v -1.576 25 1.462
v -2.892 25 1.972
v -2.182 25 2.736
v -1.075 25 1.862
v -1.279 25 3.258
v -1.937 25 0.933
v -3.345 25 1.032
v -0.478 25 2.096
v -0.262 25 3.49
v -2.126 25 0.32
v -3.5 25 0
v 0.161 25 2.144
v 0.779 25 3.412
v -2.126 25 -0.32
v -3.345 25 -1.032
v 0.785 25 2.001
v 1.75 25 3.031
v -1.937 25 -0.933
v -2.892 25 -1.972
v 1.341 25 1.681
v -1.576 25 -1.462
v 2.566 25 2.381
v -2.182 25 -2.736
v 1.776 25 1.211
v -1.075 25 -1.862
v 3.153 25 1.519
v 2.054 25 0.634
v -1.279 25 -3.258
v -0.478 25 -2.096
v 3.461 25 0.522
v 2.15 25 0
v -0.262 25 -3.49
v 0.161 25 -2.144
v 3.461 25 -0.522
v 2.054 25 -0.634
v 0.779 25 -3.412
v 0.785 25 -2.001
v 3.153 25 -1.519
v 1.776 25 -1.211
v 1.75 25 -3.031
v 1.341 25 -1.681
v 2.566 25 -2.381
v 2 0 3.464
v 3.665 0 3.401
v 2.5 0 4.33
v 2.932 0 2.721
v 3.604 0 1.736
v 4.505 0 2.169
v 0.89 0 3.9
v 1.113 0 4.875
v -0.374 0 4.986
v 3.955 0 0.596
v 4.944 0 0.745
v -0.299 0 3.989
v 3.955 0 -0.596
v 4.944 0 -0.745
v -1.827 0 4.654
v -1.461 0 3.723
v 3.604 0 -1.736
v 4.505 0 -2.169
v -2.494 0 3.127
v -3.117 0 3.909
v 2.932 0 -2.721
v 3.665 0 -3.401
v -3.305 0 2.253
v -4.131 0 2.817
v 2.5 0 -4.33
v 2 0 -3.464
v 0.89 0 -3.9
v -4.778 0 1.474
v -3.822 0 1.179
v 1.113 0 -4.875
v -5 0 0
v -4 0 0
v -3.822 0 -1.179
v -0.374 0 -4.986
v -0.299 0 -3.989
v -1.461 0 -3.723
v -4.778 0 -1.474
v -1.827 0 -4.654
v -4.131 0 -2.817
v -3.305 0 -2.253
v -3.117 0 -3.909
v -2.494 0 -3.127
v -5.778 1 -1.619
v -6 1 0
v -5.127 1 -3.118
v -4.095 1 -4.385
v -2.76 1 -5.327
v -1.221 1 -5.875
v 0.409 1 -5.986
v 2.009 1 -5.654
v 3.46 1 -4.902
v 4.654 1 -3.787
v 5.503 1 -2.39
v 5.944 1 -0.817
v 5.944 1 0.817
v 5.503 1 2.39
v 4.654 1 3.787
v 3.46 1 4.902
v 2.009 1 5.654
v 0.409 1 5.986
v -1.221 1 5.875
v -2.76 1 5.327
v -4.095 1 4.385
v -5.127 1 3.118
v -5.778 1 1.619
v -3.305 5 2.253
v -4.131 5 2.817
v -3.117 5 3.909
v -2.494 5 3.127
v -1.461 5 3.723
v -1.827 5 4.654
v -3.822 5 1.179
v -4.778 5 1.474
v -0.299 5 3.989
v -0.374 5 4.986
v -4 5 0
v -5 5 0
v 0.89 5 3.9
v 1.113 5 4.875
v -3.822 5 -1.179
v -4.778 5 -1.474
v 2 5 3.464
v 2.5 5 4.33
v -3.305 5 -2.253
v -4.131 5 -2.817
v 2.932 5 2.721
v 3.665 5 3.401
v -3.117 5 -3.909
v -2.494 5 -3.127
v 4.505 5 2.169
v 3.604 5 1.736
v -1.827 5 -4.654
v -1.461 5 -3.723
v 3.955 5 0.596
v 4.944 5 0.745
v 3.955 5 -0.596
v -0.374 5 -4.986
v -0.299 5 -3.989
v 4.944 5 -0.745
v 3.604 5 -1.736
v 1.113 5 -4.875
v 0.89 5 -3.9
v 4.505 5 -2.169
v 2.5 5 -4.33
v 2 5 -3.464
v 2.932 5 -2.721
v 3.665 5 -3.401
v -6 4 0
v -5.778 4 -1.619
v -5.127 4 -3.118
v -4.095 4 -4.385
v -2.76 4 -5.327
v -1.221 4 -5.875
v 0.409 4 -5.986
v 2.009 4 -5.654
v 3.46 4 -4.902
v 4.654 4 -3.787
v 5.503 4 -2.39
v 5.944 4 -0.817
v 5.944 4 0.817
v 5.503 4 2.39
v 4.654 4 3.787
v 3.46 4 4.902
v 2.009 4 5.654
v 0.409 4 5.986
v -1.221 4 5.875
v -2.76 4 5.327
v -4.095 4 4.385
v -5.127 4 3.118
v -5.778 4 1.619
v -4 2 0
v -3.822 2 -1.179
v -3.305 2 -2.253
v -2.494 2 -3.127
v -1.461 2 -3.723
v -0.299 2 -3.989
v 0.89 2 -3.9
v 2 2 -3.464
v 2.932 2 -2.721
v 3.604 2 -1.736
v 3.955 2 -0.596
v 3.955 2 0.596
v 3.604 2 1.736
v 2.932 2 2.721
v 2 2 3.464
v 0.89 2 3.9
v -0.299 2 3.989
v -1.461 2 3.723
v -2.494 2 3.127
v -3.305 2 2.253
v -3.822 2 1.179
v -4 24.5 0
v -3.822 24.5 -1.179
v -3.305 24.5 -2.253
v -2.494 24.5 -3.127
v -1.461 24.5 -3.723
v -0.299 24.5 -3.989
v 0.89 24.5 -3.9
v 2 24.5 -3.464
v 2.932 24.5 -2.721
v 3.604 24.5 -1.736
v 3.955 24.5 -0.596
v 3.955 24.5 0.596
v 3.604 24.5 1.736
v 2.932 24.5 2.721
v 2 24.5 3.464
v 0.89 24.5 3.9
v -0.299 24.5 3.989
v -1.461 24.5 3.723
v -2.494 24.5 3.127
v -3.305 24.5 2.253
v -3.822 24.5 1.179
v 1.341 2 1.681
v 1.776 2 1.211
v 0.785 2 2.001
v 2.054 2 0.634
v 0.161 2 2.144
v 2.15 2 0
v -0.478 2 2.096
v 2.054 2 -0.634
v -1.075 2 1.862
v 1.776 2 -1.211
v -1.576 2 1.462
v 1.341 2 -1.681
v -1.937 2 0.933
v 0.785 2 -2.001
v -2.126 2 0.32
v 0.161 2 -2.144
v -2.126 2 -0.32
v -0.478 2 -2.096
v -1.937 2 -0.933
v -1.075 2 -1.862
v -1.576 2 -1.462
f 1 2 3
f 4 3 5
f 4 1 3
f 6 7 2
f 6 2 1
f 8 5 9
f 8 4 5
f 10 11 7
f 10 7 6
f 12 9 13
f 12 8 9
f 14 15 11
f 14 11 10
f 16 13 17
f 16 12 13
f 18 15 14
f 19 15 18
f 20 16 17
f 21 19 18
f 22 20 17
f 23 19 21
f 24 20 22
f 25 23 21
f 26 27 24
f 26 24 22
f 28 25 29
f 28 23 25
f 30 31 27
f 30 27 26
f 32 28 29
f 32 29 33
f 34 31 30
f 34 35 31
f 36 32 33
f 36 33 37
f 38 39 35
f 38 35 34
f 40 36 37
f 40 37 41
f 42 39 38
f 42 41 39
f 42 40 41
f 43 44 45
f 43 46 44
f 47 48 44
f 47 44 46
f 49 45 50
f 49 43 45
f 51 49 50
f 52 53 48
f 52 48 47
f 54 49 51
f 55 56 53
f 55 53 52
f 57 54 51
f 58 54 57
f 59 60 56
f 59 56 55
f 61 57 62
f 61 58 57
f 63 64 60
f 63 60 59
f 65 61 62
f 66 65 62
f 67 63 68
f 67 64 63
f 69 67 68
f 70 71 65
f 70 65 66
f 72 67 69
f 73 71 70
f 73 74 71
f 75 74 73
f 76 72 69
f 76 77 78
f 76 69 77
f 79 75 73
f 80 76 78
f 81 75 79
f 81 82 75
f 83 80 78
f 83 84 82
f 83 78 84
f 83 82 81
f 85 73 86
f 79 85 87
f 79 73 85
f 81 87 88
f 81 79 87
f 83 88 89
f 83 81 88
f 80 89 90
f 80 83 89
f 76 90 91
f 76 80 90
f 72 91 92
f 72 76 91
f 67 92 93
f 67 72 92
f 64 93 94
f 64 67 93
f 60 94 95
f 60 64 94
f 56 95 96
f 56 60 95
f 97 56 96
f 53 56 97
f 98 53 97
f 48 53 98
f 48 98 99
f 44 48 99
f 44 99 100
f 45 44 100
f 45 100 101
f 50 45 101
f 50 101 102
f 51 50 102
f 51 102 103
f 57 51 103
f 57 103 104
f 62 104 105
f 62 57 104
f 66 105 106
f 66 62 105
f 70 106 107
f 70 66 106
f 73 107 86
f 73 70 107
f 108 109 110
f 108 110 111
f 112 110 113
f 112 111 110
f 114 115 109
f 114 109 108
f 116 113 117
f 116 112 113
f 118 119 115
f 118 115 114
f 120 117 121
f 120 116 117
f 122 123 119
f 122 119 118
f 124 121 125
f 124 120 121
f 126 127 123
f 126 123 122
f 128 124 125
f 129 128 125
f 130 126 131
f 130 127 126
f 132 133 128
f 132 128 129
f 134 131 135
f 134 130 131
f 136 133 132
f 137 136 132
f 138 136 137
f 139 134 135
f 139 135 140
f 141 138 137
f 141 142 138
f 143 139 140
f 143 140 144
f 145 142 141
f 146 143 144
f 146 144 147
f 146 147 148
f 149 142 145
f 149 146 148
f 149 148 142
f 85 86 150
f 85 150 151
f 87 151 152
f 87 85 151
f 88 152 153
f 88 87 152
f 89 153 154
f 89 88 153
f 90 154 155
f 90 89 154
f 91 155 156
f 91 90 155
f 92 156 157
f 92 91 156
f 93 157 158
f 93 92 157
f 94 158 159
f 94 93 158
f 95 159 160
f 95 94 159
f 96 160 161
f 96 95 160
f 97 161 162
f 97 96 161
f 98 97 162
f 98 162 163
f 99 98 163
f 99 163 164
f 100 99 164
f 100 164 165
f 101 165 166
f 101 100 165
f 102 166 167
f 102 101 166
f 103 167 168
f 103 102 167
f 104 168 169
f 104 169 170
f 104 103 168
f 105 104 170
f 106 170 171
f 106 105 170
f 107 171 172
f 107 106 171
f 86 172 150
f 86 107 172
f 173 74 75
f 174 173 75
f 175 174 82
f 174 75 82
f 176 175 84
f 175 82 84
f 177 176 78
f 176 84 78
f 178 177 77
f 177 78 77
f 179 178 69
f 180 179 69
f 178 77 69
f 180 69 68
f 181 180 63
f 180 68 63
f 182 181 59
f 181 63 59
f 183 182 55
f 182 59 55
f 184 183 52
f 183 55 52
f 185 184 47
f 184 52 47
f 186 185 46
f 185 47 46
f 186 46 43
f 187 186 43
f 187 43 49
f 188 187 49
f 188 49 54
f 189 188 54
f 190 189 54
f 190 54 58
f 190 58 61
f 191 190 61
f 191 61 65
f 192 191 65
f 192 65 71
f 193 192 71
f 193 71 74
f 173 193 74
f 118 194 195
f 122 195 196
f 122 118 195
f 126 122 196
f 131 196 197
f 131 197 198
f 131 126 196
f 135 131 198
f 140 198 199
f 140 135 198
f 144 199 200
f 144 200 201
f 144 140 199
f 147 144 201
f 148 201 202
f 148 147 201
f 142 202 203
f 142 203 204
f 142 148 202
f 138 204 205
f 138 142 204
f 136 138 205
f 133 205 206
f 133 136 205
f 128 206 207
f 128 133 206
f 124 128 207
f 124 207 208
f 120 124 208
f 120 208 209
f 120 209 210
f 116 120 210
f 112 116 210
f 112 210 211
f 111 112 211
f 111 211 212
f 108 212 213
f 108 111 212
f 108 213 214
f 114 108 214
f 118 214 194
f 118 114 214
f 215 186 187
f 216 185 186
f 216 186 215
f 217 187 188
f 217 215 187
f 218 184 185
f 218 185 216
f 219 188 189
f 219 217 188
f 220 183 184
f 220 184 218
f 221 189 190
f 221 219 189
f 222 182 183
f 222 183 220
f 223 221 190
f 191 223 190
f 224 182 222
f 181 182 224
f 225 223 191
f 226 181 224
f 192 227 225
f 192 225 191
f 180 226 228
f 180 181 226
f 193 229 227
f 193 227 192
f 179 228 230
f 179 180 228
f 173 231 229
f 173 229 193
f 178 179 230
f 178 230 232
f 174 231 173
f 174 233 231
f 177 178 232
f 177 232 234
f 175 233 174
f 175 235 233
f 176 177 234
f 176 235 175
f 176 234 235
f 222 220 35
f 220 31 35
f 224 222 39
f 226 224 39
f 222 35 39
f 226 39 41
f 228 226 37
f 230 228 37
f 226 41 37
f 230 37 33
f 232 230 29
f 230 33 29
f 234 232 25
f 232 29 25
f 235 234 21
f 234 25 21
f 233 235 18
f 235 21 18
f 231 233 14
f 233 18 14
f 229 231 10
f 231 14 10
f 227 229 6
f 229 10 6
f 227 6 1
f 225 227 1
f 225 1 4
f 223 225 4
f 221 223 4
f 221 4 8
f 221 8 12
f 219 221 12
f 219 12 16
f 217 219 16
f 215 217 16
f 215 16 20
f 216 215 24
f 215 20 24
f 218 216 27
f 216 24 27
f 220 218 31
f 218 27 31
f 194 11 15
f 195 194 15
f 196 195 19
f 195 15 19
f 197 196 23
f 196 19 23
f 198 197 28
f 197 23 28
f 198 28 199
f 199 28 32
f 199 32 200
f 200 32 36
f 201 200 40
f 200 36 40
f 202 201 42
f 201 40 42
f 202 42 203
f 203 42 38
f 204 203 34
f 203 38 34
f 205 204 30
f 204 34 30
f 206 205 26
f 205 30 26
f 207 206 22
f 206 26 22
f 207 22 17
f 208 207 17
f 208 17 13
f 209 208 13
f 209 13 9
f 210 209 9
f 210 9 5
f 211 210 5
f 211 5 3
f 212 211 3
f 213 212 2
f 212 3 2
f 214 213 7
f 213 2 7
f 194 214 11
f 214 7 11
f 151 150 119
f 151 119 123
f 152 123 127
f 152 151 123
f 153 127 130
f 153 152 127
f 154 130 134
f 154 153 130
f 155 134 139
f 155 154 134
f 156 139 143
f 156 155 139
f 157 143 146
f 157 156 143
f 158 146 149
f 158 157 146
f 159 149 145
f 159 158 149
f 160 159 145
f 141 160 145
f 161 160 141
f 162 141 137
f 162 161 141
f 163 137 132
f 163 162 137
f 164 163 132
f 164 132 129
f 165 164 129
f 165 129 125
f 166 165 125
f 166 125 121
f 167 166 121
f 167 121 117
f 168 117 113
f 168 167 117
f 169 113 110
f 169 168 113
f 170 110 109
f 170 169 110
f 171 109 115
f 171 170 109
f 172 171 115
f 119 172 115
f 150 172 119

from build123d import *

# Parameters (mm, degrees)
STIRNSENKUNG_F_R_M4_ZYLINDERSCHRAUBE_MIT_D           = 4.3
STIRNSENKUNG_F_R_M4_ZYLINDERSCHRAUBE_MIT_CBORE_D     = 8
STIRNSENKUNG_F_R_M4_ZYLINDERSCHRAUBE_MIT_CBORE_DEPTH = 2
FASE1_SIZE                                           = 1
FASE2_SIZE                                           = 0.5


with BuildPart() as part:
    # Skizze1 → Rotation1 (revolve)
    with BuildSketch(Plane.XY):
        Polygon((0, 0), (0, 25), (-4, 25), (-4, 5), (-6, 5), (-6, 0), align=None)
    revolve(axis=Axis((0, 0, 0), (0, -1, 0)))

    # Stirnsenkung für M4 Zylinderschraube mit Innensechskant1 (through all)
    with Locations(Plane(origin=(0, 0, 0), x_dir=(-1, 0, 0), z_dir=(0, -1, 0))):
        with Locations((0, 0)):
            CounterBoreHole(STIRNSENKUNG_F_R_M4_ZYLINDERSCHRAUBE_MIT_D / 2, STIRNSENKUNG_F_R_M4_ZYLINDERSCHRAUBE_MIT_CBORE_D / 2, STIRNSENKUNG_F_R_M4_ZYLINDERSCHRAUBE_MIT_CBORE_DEPTH)

    # Fase1
    fase1_edges = [part.edges().sort_by_distance(p)[0] for p in [
        (6, 0, 0),
        (6, 5, 0),
    ]]
    chamfer(fase1_edges, length=FASE1_SIZE)

    # Fase2
    fase2_edges = [part.edges().sort_by_distance(p)[0] for p in [
        (4, 25, 0),
    ]]
    chamfer(fase2_edges, length=FASE2_SIZE)


solid = part.part
